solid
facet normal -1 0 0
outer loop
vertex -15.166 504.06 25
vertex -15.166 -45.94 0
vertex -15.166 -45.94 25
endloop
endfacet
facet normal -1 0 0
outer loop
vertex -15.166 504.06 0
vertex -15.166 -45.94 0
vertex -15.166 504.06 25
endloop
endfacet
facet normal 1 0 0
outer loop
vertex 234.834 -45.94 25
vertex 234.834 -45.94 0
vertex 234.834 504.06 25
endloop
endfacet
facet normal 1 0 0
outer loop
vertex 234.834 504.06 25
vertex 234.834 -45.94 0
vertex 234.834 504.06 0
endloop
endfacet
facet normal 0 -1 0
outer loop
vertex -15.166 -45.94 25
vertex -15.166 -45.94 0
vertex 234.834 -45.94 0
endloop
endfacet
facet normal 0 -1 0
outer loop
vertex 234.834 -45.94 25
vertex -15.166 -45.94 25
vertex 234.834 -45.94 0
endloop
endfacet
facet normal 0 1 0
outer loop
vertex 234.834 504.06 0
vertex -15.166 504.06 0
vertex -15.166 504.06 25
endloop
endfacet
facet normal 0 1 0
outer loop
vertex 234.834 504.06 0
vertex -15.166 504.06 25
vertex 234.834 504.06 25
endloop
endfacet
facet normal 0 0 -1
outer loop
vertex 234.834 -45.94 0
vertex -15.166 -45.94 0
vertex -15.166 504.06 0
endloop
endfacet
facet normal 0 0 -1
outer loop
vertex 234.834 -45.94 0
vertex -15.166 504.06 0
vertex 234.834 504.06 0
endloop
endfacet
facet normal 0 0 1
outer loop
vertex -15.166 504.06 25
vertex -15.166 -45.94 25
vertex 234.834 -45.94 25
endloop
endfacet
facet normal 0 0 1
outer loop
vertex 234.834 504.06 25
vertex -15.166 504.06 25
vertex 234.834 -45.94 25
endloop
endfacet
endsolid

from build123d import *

# Parameters (mm, degrees)
F0_W     = 250
F0_H     = 550
F1_DEPTH = 25
F2_DEPTH = 25
F3_DEPTH = 25
F4_DEPTH = 25
F5_DEPTH = 25


with BuildPart() as f1:
    # F0 (on Top) → F1 (new body)
    with BuildSketch(Plane.XY):
        with Locations((109.834085, 229.059995)):
            Rectangle(F0_W, F0_H)
    extrude(amount=F1_DEPTH)

    # F0 (on Top) → F2 (join)
    with BuildSketch(Plane.XY):
        with Locations((109.834085, 229.059995)):
            Rectangle(F0_W, F0_H)
    extrude(amount=F2_DEPTH)

    # F0 (on Top) → F3 (join)
    with BuildSketch(Plane.XY):
        with Locations((109.834085, 229.059995)):
            Rectangle(F0_W, F0_H)
    extrude(amount=F3_DEPTH)

    # F0 (on Top) → F4 (join)
    with BuildSketch(Plane.XY):
        with Locations((109.834085, 229.059995)):
            Rectangle(F0_W, F0_H)
    extrude(amount=F4_DEPTH)

    # F0 (on Top) → F5 (join)
    with BuildSketch(Plane.XY):
        with Locations((109.834085, 229.059995)):
            Rectangle(F0_W, F0_H)
    extrude(amount=F5_DEPTH)


solid = f1.part
